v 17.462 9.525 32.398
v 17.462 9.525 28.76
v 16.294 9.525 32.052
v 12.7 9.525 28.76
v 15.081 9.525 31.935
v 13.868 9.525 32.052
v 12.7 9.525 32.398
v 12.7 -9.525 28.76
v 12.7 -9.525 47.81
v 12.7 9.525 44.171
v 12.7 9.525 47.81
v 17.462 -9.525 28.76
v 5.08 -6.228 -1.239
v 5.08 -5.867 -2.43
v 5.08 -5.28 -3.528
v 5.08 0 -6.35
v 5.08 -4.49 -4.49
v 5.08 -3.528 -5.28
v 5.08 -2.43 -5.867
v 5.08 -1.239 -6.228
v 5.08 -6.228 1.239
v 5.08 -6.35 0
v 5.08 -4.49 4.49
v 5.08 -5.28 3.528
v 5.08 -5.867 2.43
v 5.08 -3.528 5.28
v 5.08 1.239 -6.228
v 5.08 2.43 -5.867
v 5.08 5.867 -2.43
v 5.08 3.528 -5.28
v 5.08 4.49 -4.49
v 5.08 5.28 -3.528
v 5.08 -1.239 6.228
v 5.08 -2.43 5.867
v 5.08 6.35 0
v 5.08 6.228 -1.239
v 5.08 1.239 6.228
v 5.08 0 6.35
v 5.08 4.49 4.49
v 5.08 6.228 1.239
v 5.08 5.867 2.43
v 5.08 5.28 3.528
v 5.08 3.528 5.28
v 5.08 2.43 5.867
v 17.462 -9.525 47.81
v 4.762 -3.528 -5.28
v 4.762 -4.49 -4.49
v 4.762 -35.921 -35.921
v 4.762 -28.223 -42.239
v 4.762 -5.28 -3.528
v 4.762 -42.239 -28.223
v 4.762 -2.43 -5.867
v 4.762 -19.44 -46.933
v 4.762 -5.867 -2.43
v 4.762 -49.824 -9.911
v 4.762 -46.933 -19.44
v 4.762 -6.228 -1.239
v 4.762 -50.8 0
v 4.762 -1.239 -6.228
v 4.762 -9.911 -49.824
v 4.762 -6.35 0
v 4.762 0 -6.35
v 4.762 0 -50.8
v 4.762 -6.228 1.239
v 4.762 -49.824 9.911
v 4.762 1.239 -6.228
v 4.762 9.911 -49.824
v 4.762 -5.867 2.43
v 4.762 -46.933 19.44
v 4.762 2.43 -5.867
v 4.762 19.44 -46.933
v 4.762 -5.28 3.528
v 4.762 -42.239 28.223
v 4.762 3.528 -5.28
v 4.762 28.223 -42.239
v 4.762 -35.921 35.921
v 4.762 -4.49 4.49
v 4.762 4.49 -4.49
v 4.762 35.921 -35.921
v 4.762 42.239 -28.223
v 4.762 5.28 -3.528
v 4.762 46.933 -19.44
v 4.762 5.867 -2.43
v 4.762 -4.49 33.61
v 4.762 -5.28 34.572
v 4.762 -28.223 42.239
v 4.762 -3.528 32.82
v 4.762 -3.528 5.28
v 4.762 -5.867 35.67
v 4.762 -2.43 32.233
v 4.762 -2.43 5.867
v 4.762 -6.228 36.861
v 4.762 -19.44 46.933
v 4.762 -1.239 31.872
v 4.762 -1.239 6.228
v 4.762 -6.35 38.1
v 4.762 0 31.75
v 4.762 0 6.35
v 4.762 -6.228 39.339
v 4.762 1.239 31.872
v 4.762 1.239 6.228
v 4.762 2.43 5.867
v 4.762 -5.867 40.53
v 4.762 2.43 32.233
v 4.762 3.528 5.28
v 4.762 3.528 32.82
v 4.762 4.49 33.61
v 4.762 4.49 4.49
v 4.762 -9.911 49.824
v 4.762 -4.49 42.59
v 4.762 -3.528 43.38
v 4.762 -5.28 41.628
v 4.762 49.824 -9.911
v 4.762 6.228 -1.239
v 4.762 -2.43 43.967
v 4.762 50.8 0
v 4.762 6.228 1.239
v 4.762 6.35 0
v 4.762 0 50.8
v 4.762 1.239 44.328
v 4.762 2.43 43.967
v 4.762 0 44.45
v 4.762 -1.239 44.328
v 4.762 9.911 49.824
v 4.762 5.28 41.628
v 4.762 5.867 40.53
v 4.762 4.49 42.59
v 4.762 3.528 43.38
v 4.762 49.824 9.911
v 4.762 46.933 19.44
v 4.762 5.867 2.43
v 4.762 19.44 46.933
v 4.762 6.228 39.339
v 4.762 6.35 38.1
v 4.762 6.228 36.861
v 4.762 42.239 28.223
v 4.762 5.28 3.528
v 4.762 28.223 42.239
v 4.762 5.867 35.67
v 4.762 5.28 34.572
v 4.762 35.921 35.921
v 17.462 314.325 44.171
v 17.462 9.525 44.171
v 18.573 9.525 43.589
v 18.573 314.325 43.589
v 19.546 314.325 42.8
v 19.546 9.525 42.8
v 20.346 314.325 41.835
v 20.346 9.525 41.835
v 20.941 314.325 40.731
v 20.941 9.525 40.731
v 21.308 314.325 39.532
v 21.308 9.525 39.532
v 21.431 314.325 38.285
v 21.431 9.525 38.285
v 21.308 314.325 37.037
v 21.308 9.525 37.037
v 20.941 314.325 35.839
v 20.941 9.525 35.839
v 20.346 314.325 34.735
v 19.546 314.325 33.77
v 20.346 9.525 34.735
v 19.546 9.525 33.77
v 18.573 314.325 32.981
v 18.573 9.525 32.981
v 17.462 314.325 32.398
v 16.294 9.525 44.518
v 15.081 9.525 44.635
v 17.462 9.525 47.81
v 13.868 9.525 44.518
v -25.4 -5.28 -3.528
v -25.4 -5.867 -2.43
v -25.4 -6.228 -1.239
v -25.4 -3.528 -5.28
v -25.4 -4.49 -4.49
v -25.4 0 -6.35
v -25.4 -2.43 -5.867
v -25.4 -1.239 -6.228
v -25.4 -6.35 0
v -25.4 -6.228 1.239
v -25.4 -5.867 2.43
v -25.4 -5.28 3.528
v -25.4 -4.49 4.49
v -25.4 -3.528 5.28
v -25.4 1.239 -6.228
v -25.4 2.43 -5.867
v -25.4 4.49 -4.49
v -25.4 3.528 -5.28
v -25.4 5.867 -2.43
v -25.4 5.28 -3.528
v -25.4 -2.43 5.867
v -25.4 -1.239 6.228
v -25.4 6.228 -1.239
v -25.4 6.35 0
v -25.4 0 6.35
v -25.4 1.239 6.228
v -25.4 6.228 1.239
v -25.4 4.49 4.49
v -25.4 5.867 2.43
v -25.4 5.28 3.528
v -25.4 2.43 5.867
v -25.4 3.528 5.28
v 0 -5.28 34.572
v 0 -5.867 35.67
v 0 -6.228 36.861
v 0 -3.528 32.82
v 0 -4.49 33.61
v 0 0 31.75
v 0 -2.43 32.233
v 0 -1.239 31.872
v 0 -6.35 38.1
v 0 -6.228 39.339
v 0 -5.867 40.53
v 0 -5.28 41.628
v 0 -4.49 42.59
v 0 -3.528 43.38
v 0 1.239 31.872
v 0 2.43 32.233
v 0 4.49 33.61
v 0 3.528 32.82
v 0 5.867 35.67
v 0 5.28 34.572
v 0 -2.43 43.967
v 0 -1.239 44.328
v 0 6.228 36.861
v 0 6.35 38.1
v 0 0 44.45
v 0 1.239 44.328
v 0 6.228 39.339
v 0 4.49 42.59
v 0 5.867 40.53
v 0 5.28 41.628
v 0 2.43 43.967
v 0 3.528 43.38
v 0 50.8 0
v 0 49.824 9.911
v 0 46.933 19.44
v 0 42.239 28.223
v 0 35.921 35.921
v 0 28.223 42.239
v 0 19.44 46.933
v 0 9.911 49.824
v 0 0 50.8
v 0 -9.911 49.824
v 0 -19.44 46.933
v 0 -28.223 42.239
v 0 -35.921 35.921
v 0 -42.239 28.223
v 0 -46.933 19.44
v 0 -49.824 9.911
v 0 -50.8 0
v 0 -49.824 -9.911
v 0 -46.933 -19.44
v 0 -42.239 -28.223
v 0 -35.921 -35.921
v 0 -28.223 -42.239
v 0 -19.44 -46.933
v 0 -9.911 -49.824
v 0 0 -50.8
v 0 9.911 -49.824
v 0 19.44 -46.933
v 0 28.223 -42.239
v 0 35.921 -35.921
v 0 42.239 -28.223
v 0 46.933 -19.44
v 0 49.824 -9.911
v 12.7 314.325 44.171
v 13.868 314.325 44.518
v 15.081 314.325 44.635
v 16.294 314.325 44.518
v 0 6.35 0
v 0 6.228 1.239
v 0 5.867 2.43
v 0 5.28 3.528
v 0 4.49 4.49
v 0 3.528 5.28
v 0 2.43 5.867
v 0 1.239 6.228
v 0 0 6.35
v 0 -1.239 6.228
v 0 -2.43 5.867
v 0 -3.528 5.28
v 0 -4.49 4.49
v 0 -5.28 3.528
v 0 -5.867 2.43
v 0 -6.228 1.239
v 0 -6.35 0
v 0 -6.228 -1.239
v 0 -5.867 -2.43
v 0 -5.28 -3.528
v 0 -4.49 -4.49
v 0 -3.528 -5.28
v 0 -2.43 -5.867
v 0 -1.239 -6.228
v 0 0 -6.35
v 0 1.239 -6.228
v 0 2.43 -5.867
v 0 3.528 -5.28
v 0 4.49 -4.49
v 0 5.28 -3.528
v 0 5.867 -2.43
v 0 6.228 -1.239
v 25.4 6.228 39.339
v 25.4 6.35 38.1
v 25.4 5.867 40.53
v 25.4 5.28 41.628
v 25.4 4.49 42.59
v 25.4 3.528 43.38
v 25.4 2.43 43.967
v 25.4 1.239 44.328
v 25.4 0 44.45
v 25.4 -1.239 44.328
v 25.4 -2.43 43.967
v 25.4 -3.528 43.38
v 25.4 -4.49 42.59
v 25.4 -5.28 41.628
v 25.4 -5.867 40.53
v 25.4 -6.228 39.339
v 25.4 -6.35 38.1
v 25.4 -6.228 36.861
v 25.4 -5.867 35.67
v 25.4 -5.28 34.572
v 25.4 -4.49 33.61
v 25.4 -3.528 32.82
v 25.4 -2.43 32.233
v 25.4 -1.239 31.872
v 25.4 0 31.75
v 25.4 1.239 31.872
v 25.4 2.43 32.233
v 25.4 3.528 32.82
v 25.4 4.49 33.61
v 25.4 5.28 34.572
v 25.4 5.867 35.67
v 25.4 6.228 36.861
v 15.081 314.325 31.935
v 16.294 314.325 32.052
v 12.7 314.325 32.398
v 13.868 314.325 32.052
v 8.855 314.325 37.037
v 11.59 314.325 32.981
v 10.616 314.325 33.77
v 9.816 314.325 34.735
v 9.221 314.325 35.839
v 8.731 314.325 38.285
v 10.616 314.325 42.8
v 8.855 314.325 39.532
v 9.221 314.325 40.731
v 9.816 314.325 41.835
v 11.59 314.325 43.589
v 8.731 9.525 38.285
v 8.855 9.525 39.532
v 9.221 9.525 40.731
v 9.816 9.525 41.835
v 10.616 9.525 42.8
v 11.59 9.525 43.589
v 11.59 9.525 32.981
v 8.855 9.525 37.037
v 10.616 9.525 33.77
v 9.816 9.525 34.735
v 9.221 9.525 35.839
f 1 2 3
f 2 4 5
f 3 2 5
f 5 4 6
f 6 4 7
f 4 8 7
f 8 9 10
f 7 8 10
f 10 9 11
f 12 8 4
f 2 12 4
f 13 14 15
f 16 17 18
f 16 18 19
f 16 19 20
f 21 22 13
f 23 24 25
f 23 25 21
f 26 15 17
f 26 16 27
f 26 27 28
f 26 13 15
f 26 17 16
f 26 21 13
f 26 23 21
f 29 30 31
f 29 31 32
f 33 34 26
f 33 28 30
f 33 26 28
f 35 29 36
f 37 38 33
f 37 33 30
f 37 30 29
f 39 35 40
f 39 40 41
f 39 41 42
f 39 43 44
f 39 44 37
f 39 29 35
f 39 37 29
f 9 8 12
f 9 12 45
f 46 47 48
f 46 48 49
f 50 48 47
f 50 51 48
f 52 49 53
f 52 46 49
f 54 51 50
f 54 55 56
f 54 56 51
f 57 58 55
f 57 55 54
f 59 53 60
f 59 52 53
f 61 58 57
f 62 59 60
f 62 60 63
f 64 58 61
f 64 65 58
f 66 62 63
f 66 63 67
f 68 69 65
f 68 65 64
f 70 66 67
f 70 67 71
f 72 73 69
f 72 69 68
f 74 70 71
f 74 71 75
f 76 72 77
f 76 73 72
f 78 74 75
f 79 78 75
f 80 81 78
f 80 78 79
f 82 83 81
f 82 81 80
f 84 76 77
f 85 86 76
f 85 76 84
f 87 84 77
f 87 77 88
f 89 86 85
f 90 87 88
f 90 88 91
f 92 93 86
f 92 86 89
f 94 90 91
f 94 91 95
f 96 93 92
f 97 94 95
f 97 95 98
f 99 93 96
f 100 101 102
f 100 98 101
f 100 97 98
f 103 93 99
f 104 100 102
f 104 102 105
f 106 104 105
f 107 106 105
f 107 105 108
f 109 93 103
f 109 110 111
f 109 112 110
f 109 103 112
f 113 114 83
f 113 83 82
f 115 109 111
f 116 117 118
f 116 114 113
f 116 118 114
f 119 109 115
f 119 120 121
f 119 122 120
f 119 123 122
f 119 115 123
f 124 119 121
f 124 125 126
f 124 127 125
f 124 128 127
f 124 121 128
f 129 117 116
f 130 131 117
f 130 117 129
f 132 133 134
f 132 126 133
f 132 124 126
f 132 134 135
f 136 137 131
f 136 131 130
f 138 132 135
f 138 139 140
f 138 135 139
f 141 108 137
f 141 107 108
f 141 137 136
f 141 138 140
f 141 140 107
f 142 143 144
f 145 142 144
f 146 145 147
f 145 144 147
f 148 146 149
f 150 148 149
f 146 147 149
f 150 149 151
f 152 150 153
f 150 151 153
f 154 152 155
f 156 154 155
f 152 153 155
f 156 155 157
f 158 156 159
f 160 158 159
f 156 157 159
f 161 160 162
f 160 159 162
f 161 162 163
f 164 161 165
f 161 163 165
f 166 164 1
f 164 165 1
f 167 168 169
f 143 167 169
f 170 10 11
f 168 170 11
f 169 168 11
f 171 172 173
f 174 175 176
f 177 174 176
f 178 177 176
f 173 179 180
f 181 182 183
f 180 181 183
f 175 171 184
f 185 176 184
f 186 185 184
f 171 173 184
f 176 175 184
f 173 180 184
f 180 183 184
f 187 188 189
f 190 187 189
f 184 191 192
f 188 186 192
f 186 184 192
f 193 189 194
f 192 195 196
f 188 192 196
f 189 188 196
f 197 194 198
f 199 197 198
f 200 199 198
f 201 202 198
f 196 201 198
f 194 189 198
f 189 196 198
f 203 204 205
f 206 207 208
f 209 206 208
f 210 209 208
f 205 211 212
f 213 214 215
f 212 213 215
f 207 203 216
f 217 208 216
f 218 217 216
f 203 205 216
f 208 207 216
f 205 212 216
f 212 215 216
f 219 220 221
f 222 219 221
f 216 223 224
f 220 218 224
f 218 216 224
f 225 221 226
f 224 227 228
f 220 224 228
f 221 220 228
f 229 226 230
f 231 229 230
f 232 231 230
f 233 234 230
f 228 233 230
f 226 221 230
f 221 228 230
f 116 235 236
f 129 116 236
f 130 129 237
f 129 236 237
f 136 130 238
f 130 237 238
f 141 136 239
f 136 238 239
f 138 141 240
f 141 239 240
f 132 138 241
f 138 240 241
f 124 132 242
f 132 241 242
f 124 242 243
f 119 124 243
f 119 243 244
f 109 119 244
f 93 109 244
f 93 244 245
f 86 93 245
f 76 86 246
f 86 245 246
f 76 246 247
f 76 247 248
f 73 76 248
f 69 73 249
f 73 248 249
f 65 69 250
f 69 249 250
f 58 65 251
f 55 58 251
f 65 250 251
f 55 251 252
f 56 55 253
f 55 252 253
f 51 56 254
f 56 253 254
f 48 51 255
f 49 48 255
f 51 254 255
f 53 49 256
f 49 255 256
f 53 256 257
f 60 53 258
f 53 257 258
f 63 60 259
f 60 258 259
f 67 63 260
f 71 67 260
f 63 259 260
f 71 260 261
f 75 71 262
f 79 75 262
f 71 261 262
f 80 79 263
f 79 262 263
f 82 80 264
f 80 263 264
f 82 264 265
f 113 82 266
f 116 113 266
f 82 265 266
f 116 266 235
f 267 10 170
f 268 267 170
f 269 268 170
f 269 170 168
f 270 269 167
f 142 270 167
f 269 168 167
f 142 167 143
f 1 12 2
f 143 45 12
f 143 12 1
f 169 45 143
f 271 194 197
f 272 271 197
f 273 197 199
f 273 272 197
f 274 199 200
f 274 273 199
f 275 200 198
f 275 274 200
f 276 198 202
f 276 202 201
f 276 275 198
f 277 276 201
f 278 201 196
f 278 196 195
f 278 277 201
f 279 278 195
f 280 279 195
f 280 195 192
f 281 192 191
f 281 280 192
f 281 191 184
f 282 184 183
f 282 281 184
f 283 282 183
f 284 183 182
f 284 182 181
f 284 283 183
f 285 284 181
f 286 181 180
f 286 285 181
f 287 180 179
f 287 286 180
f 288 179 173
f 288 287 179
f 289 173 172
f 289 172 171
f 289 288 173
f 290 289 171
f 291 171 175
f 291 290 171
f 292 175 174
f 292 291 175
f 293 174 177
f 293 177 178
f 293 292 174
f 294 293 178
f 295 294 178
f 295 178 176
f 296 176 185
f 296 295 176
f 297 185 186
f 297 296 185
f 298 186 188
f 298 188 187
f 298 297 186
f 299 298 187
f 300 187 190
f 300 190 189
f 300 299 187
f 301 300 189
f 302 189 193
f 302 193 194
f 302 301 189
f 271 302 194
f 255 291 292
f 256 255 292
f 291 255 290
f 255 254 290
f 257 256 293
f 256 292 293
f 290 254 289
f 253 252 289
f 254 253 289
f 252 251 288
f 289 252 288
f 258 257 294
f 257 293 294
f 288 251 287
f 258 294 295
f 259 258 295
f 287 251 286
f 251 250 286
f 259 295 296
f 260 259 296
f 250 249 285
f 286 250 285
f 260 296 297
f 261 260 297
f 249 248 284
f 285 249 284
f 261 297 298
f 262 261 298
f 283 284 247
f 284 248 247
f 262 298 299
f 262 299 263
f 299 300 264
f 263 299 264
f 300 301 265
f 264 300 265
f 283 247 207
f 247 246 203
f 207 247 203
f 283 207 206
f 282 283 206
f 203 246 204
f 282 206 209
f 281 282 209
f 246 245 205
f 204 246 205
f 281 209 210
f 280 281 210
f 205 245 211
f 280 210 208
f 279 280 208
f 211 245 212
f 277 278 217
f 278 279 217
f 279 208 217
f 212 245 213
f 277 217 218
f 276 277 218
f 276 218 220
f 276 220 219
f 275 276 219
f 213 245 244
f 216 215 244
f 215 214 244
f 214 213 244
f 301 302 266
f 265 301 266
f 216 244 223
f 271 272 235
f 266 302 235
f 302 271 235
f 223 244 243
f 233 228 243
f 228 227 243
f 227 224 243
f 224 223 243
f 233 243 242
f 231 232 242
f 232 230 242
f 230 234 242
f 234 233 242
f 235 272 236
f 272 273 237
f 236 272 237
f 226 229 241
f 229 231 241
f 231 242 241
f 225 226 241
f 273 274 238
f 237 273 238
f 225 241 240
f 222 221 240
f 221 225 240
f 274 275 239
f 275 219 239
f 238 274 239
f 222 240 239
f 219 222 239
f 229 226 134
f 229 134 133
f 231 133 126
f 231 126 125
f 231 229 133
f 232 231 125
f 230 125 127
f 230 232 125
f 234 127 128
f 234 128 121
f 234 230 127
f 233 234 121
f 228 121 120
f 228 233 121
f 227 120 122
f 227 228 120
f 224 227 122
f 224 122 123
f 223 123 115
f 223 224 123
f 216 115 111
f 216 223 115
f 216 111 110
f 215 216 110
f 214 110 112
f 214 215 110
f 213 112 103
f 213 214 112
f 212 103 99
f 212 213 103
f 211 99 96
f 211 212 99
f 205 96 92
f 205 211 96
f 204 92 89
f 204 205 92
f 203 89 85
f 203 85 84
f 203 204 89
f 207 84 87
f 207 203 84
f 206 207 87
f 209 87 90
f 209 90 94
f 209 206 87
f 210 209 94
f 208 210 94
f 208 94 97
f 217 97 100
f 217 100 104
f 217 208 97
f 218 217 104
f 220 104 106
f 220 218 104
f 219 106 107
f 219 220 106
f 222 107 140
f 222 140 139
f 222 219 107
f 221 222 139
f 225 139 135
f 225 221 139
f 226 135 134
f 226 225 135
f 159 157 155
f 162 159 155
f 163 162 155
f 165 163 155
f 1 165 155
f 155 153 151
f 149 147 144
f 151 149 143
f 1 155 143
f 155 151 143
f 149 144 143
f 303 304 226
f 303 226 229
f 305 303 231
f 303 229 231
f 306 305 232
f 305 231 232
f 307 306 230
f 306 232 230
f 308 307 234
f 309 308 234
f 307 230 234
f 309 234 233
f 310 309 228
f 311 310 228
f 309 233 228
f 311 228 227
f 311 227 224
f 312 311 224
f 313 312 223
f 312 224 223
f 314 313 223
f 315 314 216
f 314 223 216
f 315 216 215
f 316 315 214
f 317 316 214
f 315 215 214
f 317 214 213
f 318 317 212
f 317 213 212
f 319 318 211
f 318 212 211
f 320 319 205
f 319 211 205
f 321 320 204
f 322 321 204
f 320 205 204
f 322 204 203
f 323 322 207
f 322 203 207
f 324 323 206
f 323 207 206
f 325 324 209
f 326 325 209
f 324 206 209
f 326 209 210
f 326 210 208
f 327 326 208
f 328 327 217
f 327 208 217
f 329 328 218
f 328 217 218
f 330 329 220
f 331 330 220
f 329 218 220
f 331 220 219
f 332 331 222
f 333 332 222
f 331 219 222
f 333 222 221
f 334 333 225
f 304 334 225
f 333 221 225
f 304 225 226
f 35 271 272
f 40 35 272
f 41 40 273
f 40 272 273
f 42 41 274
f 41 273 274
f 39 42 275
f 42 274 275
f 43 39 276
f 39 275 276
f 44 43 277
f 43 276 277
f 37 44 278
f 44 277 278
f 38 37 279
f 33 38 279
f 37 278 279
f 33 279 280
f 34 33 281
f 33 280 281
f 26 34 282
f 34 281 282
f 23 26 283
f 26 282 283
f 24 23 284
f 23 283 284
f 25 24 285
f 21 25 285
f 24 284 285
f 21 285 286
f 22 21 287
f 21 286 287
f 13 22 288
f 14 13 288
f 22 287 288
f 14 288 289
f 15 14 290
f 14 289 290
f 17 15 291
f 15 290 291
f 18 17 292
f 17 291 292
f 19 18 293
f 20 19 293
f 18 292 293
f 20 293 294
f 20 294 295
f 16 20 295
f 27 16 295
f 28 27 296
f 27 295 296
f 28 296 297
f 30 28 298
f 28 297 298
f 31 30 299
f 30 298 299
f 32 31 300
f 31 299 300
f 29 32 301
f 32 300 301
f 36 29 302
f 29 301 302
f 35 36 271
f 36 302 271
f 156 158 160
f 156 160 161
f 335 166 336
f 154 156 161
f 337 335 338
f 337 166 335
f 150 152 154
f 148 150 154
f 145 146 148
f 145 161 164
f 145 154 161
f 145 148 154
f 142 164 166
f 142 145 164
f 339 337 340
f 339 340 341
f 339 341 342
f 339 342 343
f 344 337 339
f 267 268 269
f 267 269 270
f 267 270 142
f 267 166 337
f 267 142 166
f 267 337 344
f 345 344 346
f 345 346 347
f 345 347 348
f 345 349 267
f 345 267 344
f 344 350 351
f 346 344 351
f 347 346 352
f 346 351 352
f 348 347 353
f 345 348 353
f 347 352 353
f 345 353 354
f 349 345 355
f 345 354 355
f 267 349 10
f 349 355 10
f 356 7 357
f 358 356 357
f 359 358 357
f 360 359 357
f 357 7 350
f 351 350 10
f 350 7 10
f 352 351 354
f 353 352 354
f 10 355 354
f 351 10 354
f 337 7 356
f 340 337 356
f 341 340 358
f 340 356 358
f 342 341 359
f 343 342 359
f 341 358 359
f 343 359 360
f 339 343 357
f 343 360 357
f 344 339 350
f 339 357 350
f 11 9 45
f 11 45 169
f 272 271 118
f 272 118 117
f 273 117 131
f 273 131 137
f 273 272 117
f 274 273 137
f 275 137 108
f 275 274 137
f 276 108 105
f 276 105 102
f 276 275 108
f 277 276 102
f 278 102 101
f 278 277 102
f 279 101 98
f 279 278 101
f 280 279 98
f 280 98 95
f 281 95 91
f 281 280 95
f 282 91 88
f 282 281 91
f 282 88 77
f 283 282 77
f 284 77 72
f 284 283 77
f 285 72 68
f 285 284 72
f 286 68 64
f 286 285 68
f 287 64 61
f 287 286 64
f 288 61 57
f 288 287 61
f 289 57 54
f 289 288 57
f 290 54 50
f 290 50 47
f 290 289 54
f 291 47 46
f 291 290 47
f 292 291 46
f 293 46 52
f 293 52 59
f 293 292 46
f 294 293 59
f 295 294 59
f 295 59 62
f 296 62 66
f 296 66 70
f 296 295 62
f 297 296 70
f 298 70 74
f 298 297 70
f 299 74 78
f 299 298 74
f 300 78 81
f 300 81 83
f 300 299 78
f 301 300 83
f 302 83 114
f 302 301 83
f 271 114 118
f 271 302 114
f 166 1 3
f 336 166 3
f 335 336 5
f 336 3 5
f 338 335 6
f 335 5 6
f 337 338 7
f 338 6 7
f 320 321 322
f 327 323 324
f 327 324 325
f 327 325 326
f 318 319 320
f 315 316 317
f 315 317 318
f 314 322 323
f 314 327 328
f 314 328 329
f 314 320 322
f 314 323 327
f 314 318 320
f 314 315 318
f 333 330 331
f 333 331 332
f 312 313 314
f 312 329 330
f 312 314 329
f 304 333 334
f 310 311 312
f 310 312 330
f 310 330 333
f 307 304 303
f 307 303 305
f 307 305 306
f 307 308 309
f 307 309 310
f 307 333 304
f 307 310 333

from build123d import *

# Parameters (mm, degrees)
F0_R          = 50.8
F0_R_2        = 6.35
F1_DEPTH      = 4.7625
F2_DEPTH      = 25.4
F4_W          = 19.05
F4_H          = 19.05
F5_DEPTH      = 4.7625
F7_DEPTH      = 304.8
F8_DEPTH      = 25.4
F8_DEPTH_BACK = 5.08


# Not quite as in the source:
# - a feature names something its author has since deleted; it is built from what else it names


with BuildPart() as f1:
    # F0 (on Right) → F1 (new body)
    with BuildSketch(Plane.YZ):
        Circle(F0_R)
        Circle(F0_R_2, mode=Mode.SUBTRACT)
        with Locations((0, 38.1)):
            Circle(F0_R_2, mode=Mode.SUBTRACT)
    extrude(amount=F1_DEPTH)


with BuildPart() as f2:
    # F0 (on Right) → F2 (new body)
    with BuildSketch(Plane.YZ):
        with Locations((0, 38.1)):
            Circle(F0_R_2)
    extrude(amount=F2_DEPTH)


with BuildPart() as f5:
    # F4 (on offset) → F5 (new body)
    with BuildSketch(Plane.YZ.offset(12.7)):
        with Locations((0, 38.2848121226)):
            Rectangle(F4_W, F4_H)
    extrude(amount=F5_DEPTH)

    # F6 (on face) → F7 (join)
    with BuildSketch(Plane(origin=(0, 9.525, 0), x_dir=(-1, 0, 0), z_dir=(0, 1, 0))):
        with BuildLine():
            Line((-17.4625, 32.3982045735), (-17.4625, 44.1714196717))
            ThreePointArc((-17.4625, 44.1714196717), (-21.43125, 38.2848121226), (-17.4625, 32.3982045735))
        make_face()
        with BuildLine():
            Line((-12.7, 32.3982045735), (-12.7, 44.1714196717))
            ThreePointArc((-12.7, 44.1714196717), (-15.08125, 44.6348121226), (-17.4625, 44.1714196717))
            Line((-17.4625, 44.1714196717), (-17.4625, 32.3982045735))
            ThreePointArc((-17.4625, 32.3982045735), (-15.08125, 31.9348121226), (-12.7, 32.3982045735))
        make_face()
        with BuildLine():
            ThreePointArc((-12.7, 32.3982045735), (-9.8161081453, 34.7350542083), (-8.73125, 38.2848121226))
            ThreePointArc((-8.73125, 38.2848121226), (-9.8161081453, 41.8345700369), (-12.7, 44.1714196717))
            Line((-12.7, 44.1714196717), (-12.7, 32.3982045735))
        make_face()
    extrude(amount=F7_DEPTH)


with BuildPart() as f8:
    # F0 (on Right) → F8 (new body, two sides)
    with BuildSketch(Plane.YZ) as f8_sk:
        Circle(F0_R_2)
    extrude(amount=-F8_DEPTH)
    extrude(f8_sk.sketch, amount=F8_DEPTH_BACK)


solid = Compound([f1.part, f2.part, f5.part, f8.part])
